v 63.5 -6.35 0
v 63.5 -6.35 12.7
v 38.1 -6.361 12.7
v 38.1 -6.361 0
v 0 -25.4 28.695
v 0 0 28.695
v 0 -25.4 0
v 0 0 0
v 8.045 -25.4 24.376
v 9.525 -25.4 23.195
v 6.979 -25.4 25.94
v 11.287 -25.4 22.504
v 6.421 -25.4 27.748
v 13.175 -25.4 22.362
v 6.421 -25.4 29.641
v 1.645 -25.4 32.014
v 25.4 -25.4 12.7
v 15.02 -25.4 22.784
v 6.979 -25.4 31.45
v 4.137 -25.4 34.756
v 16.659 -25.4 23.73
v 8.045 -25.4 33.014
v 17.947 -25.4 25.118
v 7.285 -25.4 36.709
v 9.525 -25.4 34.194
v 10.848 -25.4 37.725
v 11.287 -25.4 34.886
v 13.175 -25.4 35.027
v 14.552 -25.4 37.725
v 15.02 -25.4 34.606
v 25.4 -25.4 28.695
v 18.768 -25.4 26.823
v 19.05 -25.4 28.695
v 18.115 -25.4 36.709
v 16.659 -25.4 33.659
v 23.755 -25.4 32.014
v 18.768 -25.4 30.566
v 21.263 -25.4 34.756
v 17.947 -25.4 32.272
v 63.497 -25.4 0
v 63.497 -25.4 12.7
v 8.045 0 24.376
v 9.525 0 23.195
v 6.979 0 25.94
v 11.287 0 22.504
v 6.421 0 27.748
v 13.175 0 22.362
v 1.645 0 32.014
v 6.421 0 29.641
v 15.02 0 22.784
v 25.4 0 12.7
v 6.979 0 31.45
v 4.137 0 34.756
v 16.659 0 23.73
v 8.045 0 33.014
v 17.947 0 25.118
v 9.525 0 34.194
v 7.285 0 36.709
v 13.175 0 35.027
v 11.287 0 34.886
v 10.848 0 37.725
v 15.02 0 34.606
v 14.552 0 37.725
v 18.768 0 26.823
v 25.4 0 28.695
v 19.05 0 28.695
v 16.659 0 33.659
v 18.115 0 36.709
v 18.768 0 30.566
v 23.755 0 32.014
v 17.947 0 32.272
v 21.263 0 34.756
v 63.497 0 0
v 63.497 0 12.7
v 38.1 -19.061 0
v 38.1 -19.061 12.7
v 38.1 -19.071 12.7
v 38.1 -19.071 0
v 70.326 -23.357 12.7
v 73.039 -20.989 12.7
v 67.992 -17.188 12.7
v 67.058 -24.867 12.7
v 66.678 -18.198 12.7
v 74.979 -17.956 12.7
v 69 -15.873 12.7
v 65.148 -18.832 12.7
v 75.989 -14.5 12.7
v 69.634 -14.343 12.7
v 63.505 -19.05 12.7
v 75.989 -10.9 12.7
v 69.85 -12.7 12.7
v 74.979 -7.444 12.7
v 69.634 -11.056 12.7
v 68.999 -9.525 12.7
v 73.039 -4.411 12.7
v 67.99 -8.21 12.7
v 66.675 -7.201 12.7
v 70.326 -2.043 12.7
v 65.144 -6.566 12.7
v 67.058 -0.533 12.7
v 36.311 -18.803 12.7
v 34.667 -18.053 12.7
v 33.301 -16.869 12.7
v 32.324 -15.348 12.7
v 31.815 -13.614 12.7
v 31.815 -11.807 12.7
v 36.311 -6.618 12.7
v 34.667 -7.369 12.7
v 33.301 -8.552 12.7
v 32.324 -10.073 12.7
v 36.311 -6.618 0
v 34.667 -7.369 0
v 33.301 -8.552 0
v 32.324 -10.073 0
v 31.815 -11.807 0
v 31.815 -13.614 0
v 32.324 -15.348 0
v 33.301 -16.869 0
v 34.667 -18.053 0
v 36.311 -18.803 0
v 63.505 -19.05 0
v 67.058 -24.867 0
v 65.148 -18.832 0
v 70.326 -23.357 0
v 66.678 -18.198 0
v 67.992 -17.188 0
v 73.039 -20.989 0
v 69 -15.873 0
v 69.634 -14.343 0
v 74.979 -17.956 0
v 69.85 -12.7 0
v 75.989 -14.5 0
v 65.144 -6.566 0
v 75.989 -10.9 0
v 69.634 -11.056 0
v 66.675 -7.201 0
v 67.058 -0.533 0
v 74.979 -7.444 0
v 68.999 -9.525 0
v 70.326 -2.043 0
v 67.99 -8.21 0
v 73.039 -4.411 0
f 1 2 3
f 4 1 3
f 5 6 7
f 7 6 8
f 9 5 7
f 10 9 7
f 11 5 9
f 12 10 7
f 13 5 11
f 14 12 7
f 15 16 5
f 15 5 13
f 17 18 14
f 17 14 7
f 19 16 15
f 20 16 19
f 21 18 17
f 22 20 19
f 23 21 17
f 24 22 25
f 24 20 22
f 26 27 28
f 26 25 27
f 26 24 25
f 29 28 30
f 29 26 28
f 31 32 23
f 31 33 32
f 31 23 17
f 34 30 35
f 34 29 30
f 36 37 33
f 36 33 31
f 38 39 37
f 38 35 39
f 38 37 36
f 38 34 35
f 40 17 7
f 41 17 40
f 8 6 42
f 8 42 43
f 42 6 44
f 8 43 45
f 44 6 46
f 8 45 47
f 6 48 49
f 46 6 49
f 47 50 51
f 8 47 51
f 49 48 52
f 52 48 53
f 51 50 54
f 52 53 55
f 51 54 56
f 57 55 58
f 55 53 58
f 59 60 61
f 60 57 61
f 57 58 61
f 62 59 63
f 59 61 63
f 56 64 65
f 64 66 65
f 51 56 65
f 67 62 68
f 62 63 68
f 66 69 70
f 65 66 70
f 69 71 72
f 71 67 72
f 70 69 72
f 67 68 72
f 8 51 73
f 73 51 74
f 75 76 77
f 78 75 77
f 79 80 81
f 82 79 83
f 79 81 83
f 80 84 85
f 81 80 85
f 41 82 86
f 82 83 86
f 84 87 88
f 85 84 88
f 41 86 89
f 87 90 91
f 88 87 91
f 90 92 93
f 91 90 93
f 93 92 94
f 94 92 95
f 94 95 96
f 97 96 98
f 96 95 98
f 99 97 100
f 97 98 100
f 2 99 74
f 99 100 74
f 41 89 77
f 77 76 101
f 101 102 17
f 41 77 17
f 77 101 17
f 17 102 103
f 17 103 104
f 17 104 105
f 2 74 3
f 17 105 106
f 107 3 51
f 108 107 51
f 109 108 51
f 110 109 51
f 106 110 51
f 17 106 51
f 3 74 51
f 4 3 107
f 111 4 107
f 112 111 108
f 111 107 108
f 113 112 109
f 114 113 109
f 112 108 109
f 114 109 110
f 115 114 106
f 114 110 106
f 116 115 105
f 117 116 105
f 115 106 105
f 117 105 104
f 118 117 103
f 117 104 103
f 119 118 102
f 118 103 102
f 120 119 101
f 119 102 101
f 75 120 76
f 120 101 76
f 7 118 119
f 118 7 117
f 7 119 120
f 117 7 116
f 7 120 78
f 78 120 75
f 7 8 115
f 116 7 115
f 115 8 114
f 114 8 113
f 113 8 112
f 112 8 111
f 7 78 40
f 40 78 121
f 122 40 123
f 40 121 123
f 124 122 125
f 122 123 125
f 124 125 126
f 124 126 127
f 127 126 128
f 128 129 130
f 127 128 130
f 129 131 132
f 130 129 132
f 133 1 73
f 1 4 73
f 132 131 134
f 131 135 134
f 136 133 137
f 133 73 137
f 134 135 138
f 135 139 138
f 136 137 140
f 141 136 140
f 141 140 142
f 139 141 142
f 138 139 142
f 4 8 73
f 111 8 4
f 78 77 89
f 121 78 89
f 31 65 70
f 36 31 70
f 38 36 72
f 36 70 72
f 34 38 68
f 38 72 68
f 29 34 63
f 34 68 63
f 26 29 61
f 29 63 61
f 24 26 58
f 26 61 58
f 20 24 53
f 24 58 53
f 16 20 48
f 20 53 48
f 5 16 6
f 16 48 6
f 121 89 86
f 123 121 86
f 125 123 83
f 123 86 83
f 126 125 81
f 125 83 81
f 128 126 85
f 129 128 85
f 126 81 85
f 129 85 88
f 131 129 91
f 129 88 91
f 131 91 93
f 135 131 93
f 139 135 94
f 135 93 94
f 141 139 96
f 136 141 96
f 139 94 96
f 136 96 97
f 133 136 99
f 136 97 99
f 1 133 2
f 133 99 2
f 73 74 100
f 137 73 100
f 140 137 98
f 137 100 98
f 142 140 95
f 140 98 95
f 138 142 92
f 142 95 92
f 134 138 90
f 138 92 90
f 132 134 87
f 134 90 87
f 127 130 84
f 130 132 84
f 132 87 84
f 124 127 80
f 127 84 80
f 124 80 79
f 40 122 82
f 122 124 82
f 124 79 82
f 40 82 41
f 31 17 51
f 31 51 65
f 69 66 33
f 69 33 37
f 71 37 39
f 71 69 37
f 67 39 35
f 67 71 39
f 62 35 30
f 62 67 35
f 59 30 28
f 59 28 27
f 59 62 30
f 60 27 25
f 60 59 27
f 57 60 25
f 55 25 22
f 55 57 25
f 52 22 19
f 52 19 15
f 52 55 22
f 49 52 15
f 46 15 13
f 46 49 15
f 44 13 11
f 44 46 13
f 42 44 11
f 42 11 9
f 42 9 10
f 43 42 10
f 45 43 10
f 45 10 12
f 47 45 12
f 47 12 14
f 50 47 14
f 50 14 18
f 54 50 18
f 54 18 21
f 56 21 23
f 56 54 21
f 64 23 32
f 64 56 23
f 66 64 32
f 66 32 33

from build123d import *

# Parameters (mm, degrees)
F0_R     = 6.35
F1_DEPTH = 25.4
F3_DEPTH = 25.4
F5_DEPTH = 25.4


with BuildPart() as f1:
    # F0 (on Front) → F1 (new body)
    with BuildSketch(Plane.XZ):
        with BuildLine():
            Line((0, 28.6947377026), (0, 0))
            Line((0, 0), (76.2, 0))
            Line((76.2, 0), (76.2, 12.7))
            Line((76.2, 12.7), (25.4, 12.7))
            Line((25.4, 12.7), (25.4, 28.6947377026))
            ThreePointArc((25.4, 28.6947377026), (12.7, 37.8535239462), (0, 28.6947377026))
        make_face()
        with Locations((12.7, 28.6947377026)):
            Circle(F0_R, mode=Mode.SUBTRACT)
    extrude(amount=F1_DEPTH)

    # F2 (on face) → F3 (cut)
    with BuildSketch(Plane.XY.offset(12.7)):
        with BuildLine():
            ThreePointArc((38.1, -6.3605568116), (42.5901280605, -8.220428751), (44.45, -12.7105568116))
            ThreePointArc((44.45, -12.7105568116), (42.5901280605, -17.2006848721), (38.1, -19.0605568116))
            Line((38.1, -19.0605568116), (38.1, -19.0711169188))
            Line((38.1, -19.0711169188), (63.5052786794, -19.0499978059))
            Line((63.5052786794, -19.0499978059), (63.5, -6.3499994515))
            Line((63.5, -6.3499994515), (38.1, -6.3605568116))
        make_face()
        with BuildLine():
            Line((38.1, -19.0605568116), (38.1, -6.3605568116))
            ThreePointArc((38.1, -6.3605568116), (31.75, -12.7105568116), (38.1, -19.0605568116))
        make_face()
        with BuildLine():
            ThreePointArc((38.1, -19.0605568116), (42.5901280605, -17.2006848721), (44.45, -12.7105568116))
            ThreePointArc((44.45, -12.7105568116), (42.5901280605, -8.220428751), (38.1, -6.3605568116))
            Line((38.1, -6.3605568116), (38.1, -19.0605568116))
        make_face()
        with BuildLine():
            ThreePointArc((69.85, -12.7), (67.9901280605, -8.2098719395), (63.5, -6.35))
            ThreePointArc((63.5, -6.35), (57.1500005485, -12.7026393399), (63.5052786794, -19.0499978059))
            ThreePointArc((63.5052786794, -19.0499978059), (67.9919939678, -17.1882613775), (69.85, -12.7))
        make_face()
    extrude(amount=-F3_DEPTH, mode=Mode.SUBTRACT)

    # F4 (on face) → F5 (cut)
    with BuildSketch(Plane.XY.offset(12.7)):
        with BuildLine():
            ThreePointArc((63.4973606602, 0), (76.1177273109, -12.7), (63.4973606602, -25.4))
            Line((63.4973606602, -25.4), (76.2, -25.4))
            Line((76.2, -25.4), (76.2, 0))
            Line((76.2, 0), (63.4973606602, 0))
        make_face()
    extrude(amount=-F5_DEPTH, mode=Mode.SUBTRACT)


solid = f1.part
